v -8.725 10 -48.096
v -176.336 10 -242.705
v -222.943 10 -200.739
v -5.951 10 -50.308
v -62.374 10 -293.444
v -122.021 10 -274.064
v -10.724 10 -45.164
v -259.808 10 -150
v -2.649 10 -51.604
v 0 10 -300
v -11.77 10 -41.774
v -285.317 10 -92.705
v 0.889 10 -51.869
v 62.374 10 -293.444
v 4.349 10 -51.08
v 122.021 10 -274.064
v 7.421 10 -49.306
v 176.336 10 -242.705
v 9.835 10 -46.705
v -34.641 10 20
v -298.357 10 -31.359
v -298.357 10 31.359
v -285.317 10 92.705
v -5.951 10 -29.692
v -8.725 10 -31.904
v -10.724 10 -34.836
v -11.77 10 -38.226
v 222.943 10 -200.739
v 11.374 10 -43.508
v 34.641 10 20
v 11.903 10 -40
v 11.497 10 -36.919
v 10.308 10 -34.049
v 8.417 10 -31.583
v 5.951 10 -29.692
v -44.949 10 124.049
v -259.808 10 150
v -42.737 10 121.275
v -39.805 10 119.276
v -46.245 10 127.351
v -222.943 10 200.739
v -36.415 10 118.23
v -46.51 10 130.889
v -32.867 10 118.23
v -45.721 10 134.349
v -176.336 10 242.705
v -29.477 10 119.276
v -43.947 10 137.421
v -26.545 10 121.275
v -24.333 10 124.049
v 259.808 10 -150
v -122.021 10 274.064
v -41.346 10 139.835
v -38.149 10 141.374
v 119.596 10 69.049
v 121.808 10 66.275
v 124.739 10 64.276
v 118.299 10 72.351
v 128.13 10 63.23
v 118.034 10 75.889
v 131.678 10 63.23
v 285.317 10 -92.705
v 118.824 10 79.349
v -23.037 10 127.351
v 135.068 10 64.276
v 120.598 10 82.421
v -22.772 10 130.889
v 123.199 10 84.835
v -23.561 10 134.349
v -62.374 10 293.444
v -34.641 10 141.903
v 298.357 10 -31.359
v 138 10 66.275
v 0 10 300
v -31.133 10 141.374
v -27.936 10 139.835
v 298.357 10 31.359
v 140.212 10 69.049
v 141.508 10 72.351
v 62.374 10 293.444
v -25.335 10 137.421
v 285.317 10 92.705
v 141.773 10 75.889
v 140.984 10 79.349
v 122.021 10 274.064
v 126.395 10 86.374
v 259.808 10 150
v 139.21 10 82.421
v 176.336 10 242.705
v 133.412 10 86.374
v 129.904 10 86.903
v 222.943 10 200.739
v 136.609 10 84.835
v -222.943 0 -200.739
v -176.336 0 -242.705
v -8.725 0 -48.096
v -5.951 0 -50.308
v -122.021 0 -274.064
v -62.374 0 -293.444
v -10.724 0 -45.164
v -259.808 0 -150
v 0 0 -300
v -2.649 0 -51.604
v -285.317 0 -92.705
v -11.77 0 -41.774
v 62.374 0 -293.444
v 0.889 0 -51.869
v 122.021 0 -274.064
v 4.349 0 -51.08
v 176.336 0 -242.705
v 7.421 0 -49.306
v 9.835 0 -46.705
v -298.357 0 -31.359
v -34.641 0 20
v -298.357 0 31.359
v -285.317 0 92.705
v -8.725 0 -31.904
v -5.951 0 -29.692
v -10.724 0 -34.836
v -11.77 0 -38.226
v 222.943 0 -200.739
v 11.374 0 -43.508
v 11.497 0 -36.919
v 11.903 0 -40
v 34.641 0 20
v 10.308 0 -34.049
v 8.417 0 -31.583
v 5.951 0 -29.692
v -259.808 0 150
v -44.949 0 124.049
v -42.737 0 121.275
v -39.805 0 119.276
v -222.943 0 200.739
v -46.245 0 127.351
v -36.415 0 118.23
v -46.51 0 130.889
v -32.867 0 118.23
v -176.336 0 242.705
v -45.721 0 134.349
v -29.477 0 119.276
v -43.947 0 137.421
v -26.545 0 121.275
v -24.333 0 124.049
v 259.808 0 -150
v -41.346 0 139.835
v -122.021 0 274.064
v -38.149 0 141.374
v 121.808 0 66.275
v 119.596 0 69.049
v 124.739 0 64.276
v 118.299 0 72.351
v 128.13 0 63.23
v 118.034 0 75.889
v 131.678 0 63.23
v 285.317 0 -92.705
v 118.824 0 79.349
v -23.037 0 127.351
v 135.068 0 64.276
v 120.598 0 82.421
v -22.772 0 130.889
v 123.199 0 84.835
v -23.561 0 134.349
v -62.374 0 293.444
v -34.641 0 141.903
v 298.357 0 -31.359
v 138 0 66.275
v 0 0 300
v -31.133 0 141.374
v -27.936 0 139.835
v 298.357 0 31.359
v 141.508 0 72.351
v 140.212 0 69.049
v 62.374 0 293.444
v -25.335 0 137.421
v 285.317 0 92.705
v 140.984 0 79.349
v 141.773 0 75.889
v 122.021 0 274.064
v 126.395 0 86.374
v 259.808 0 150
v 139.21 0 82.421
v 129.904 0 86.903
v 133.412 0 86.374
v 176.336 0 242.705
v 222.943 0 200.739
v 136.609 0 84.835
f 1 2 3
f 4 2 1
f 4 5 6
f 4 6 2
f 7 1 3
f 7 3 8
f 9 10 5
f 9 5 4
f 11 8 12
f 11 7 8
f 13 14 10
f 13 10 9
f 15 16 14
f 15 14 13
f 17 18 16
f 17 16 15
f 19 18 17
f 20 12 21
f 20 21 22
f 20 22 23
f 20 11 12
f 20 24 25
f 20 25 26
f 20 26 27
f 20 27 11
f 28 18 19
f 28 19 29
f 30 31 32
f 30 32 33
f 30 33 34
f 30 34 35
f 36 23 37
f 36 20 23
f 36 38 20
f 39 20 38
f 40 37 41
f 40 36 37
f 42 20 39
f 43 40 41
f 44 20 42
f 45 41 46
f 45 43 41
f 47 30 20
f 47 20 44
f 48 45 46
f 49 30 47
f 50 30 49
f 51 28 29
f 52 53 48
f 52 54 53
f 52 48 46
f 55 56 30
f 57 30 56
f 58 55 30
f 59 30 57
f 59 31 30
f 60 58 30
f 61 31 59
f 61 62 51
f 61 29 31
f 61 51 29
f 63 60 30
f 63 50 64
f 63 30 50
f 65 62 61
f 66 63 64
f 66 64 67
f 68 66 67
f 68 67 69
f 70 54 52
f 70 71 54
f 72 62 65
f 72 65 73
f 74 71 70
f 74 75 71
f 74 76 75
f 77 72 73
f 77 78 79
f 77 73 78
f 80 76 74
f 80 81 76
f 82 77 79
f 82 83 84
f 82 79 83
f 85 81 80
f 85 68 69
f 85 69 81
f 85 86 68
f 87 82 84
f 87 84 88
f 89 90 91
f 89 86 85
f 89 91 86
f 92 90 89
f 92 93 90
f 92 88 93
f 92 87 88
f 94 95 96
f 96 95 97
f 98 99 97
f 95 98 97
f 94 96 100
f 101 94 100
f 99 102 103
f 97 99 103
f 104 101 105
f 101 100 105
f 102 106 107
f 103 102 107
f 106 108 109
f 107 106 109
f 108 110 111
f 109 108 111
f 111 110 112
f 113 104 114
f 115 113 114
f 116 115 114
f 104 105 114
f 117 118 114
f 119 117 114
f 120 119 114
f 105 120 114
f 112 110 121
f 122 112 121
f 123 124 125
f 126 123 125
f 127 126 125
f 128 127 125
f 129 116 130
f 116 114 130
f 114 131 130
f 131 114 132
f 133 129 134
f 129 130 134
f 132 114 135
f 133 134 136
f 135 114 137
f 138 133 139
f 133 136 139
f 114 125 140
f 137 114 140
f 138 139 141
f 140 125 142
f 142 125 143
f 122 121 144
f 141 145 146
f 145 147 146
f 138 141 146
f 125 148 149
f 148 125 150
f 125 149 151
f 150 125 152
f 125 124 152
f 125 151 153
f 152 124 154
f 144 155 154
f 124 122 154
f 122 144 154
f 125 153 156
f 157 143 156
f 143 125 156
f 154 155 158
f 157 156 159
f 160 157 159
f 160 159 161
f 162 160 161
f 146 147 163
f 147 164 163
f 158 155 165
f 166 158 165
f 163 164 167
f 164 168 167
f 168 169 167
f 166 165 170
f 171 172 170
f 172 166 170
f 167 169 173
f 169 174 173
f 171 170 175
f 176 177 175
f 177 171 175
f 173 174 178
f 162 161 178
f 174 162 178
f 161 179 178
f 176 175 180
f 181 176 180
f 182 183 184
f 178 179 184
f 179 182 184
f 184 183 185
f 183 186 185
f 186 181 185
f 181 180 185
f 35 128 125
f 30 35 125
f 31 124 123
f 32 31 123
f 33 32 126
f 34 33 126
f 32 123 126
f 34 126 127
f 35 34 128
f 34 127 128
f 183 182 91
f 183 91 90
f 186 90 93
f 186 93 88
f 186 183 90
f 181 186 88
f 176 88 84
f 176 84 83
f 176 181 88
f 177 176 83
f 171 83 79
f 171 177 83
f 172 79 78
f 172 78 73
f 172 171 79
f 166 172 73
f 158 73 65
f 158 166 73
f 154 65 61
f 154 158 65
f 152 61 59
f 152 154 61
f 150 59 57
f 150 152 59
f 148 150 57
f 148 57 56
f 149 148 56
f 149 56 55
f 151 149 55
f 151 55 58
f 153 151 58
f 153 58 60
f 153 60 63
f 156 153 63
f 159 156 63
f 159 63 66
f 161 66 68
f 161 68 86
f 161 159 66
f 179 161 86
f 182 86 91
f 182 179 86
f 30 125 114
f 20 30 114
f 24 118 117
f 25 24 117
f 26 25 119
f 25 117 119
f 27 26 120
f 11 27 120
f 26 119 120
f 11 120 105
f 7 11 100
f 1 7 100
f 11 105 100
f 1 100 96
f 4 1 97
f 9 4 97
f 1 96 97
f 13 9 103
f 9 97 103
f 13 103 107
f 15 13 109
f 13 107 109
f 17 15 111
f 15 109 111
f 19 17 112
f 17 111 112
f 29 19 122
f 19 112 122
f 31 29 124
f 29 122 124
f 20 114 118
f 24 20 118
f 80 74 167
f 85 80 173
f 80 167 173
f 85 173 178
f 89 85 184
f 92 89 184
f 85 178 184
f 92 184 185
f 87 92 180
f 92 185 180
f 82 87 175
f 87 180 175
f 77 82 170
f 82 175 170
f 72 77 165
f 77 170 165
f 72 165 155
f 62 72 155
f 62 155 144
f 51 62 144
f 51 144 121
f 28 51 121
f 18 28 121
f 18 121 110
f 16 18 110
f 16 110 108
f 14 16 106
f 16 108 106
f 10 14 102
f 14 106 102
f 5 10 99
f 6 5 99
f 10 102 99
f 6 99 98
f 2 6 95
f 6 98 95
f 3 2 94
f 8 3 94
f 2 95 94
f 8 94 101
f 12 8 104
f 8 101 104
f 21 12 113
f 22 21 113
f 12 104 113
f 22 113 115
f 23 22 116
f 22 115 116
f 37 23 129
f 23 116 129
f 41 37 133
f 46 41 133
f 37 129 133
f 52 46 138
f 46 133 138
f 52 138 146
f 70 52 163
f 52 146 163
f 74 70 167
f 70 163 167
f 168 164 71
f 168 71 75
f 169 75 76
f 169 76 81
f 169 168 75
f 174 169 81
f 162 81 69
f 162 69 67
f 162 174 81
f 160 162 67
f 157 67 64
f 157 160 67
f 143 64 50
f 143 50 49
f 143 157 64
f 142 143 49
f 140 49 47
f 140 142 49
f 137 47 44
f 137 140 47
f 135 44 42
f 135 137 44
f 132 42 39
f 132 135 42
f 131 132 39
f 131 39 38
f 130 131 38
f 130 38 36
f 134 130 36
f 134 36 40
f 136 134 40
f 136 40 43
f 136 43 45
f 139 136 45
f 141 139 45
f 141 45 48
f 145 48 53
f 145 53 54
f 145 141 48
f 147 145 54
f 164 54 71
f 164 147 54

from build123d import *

# Parameters (mm, degrees)
ESQUISSE1_R        = 300
ESQUISSE1_R_2      = 11.902763715
BOSS_EXTRU_1_DEPTH = 10


with BuildPart() as part:
    # Esquisse1 → Boss.-Extru.1 (new body)
    with BuildSketch(Plane(origin=(0, 0, 0), x_dir=(1, 0, 0), z_dir=(0, 1, 0))):
        with Locations(Location((0, 0, 0), (0, 0, 270))):
            Circle(ESQUISSE1_R)
        with Locations(Location((-34.641016151, -130, 0), (0, 0, 270))):
            Circle(ESQUISSE1_R_2, mode=Mode.SUBTRACT)
        with Locations(Location((129.903810568, -75, 0), (0, 0, 270))):
            Circle(ESQUISSE1_R_2, mode=Mode.SUBTRACT)
        with BuildLine():
            Line((-34.641016151, -20), (-5.951381857, 29.691904248))
            ThreePointArc((-5.951381857, 29.691904248), (-5.951381857, 50.308095752), (11.902763715, 40))
            ThreePointArc((11.902763715, 40), (10.308095752, 34.048618143), (5.951381857, 29.691904248))
            Line((5.951381857, 29.691904248), (34.641016151, -20))
            Line((34.641016151, -20), (-34.641016151, -20))
        make_face(mode=Mode.SUBTRACT)
    extrude(amount=BOSS_EXTRU_1_DEPTH)


solid = part.part
